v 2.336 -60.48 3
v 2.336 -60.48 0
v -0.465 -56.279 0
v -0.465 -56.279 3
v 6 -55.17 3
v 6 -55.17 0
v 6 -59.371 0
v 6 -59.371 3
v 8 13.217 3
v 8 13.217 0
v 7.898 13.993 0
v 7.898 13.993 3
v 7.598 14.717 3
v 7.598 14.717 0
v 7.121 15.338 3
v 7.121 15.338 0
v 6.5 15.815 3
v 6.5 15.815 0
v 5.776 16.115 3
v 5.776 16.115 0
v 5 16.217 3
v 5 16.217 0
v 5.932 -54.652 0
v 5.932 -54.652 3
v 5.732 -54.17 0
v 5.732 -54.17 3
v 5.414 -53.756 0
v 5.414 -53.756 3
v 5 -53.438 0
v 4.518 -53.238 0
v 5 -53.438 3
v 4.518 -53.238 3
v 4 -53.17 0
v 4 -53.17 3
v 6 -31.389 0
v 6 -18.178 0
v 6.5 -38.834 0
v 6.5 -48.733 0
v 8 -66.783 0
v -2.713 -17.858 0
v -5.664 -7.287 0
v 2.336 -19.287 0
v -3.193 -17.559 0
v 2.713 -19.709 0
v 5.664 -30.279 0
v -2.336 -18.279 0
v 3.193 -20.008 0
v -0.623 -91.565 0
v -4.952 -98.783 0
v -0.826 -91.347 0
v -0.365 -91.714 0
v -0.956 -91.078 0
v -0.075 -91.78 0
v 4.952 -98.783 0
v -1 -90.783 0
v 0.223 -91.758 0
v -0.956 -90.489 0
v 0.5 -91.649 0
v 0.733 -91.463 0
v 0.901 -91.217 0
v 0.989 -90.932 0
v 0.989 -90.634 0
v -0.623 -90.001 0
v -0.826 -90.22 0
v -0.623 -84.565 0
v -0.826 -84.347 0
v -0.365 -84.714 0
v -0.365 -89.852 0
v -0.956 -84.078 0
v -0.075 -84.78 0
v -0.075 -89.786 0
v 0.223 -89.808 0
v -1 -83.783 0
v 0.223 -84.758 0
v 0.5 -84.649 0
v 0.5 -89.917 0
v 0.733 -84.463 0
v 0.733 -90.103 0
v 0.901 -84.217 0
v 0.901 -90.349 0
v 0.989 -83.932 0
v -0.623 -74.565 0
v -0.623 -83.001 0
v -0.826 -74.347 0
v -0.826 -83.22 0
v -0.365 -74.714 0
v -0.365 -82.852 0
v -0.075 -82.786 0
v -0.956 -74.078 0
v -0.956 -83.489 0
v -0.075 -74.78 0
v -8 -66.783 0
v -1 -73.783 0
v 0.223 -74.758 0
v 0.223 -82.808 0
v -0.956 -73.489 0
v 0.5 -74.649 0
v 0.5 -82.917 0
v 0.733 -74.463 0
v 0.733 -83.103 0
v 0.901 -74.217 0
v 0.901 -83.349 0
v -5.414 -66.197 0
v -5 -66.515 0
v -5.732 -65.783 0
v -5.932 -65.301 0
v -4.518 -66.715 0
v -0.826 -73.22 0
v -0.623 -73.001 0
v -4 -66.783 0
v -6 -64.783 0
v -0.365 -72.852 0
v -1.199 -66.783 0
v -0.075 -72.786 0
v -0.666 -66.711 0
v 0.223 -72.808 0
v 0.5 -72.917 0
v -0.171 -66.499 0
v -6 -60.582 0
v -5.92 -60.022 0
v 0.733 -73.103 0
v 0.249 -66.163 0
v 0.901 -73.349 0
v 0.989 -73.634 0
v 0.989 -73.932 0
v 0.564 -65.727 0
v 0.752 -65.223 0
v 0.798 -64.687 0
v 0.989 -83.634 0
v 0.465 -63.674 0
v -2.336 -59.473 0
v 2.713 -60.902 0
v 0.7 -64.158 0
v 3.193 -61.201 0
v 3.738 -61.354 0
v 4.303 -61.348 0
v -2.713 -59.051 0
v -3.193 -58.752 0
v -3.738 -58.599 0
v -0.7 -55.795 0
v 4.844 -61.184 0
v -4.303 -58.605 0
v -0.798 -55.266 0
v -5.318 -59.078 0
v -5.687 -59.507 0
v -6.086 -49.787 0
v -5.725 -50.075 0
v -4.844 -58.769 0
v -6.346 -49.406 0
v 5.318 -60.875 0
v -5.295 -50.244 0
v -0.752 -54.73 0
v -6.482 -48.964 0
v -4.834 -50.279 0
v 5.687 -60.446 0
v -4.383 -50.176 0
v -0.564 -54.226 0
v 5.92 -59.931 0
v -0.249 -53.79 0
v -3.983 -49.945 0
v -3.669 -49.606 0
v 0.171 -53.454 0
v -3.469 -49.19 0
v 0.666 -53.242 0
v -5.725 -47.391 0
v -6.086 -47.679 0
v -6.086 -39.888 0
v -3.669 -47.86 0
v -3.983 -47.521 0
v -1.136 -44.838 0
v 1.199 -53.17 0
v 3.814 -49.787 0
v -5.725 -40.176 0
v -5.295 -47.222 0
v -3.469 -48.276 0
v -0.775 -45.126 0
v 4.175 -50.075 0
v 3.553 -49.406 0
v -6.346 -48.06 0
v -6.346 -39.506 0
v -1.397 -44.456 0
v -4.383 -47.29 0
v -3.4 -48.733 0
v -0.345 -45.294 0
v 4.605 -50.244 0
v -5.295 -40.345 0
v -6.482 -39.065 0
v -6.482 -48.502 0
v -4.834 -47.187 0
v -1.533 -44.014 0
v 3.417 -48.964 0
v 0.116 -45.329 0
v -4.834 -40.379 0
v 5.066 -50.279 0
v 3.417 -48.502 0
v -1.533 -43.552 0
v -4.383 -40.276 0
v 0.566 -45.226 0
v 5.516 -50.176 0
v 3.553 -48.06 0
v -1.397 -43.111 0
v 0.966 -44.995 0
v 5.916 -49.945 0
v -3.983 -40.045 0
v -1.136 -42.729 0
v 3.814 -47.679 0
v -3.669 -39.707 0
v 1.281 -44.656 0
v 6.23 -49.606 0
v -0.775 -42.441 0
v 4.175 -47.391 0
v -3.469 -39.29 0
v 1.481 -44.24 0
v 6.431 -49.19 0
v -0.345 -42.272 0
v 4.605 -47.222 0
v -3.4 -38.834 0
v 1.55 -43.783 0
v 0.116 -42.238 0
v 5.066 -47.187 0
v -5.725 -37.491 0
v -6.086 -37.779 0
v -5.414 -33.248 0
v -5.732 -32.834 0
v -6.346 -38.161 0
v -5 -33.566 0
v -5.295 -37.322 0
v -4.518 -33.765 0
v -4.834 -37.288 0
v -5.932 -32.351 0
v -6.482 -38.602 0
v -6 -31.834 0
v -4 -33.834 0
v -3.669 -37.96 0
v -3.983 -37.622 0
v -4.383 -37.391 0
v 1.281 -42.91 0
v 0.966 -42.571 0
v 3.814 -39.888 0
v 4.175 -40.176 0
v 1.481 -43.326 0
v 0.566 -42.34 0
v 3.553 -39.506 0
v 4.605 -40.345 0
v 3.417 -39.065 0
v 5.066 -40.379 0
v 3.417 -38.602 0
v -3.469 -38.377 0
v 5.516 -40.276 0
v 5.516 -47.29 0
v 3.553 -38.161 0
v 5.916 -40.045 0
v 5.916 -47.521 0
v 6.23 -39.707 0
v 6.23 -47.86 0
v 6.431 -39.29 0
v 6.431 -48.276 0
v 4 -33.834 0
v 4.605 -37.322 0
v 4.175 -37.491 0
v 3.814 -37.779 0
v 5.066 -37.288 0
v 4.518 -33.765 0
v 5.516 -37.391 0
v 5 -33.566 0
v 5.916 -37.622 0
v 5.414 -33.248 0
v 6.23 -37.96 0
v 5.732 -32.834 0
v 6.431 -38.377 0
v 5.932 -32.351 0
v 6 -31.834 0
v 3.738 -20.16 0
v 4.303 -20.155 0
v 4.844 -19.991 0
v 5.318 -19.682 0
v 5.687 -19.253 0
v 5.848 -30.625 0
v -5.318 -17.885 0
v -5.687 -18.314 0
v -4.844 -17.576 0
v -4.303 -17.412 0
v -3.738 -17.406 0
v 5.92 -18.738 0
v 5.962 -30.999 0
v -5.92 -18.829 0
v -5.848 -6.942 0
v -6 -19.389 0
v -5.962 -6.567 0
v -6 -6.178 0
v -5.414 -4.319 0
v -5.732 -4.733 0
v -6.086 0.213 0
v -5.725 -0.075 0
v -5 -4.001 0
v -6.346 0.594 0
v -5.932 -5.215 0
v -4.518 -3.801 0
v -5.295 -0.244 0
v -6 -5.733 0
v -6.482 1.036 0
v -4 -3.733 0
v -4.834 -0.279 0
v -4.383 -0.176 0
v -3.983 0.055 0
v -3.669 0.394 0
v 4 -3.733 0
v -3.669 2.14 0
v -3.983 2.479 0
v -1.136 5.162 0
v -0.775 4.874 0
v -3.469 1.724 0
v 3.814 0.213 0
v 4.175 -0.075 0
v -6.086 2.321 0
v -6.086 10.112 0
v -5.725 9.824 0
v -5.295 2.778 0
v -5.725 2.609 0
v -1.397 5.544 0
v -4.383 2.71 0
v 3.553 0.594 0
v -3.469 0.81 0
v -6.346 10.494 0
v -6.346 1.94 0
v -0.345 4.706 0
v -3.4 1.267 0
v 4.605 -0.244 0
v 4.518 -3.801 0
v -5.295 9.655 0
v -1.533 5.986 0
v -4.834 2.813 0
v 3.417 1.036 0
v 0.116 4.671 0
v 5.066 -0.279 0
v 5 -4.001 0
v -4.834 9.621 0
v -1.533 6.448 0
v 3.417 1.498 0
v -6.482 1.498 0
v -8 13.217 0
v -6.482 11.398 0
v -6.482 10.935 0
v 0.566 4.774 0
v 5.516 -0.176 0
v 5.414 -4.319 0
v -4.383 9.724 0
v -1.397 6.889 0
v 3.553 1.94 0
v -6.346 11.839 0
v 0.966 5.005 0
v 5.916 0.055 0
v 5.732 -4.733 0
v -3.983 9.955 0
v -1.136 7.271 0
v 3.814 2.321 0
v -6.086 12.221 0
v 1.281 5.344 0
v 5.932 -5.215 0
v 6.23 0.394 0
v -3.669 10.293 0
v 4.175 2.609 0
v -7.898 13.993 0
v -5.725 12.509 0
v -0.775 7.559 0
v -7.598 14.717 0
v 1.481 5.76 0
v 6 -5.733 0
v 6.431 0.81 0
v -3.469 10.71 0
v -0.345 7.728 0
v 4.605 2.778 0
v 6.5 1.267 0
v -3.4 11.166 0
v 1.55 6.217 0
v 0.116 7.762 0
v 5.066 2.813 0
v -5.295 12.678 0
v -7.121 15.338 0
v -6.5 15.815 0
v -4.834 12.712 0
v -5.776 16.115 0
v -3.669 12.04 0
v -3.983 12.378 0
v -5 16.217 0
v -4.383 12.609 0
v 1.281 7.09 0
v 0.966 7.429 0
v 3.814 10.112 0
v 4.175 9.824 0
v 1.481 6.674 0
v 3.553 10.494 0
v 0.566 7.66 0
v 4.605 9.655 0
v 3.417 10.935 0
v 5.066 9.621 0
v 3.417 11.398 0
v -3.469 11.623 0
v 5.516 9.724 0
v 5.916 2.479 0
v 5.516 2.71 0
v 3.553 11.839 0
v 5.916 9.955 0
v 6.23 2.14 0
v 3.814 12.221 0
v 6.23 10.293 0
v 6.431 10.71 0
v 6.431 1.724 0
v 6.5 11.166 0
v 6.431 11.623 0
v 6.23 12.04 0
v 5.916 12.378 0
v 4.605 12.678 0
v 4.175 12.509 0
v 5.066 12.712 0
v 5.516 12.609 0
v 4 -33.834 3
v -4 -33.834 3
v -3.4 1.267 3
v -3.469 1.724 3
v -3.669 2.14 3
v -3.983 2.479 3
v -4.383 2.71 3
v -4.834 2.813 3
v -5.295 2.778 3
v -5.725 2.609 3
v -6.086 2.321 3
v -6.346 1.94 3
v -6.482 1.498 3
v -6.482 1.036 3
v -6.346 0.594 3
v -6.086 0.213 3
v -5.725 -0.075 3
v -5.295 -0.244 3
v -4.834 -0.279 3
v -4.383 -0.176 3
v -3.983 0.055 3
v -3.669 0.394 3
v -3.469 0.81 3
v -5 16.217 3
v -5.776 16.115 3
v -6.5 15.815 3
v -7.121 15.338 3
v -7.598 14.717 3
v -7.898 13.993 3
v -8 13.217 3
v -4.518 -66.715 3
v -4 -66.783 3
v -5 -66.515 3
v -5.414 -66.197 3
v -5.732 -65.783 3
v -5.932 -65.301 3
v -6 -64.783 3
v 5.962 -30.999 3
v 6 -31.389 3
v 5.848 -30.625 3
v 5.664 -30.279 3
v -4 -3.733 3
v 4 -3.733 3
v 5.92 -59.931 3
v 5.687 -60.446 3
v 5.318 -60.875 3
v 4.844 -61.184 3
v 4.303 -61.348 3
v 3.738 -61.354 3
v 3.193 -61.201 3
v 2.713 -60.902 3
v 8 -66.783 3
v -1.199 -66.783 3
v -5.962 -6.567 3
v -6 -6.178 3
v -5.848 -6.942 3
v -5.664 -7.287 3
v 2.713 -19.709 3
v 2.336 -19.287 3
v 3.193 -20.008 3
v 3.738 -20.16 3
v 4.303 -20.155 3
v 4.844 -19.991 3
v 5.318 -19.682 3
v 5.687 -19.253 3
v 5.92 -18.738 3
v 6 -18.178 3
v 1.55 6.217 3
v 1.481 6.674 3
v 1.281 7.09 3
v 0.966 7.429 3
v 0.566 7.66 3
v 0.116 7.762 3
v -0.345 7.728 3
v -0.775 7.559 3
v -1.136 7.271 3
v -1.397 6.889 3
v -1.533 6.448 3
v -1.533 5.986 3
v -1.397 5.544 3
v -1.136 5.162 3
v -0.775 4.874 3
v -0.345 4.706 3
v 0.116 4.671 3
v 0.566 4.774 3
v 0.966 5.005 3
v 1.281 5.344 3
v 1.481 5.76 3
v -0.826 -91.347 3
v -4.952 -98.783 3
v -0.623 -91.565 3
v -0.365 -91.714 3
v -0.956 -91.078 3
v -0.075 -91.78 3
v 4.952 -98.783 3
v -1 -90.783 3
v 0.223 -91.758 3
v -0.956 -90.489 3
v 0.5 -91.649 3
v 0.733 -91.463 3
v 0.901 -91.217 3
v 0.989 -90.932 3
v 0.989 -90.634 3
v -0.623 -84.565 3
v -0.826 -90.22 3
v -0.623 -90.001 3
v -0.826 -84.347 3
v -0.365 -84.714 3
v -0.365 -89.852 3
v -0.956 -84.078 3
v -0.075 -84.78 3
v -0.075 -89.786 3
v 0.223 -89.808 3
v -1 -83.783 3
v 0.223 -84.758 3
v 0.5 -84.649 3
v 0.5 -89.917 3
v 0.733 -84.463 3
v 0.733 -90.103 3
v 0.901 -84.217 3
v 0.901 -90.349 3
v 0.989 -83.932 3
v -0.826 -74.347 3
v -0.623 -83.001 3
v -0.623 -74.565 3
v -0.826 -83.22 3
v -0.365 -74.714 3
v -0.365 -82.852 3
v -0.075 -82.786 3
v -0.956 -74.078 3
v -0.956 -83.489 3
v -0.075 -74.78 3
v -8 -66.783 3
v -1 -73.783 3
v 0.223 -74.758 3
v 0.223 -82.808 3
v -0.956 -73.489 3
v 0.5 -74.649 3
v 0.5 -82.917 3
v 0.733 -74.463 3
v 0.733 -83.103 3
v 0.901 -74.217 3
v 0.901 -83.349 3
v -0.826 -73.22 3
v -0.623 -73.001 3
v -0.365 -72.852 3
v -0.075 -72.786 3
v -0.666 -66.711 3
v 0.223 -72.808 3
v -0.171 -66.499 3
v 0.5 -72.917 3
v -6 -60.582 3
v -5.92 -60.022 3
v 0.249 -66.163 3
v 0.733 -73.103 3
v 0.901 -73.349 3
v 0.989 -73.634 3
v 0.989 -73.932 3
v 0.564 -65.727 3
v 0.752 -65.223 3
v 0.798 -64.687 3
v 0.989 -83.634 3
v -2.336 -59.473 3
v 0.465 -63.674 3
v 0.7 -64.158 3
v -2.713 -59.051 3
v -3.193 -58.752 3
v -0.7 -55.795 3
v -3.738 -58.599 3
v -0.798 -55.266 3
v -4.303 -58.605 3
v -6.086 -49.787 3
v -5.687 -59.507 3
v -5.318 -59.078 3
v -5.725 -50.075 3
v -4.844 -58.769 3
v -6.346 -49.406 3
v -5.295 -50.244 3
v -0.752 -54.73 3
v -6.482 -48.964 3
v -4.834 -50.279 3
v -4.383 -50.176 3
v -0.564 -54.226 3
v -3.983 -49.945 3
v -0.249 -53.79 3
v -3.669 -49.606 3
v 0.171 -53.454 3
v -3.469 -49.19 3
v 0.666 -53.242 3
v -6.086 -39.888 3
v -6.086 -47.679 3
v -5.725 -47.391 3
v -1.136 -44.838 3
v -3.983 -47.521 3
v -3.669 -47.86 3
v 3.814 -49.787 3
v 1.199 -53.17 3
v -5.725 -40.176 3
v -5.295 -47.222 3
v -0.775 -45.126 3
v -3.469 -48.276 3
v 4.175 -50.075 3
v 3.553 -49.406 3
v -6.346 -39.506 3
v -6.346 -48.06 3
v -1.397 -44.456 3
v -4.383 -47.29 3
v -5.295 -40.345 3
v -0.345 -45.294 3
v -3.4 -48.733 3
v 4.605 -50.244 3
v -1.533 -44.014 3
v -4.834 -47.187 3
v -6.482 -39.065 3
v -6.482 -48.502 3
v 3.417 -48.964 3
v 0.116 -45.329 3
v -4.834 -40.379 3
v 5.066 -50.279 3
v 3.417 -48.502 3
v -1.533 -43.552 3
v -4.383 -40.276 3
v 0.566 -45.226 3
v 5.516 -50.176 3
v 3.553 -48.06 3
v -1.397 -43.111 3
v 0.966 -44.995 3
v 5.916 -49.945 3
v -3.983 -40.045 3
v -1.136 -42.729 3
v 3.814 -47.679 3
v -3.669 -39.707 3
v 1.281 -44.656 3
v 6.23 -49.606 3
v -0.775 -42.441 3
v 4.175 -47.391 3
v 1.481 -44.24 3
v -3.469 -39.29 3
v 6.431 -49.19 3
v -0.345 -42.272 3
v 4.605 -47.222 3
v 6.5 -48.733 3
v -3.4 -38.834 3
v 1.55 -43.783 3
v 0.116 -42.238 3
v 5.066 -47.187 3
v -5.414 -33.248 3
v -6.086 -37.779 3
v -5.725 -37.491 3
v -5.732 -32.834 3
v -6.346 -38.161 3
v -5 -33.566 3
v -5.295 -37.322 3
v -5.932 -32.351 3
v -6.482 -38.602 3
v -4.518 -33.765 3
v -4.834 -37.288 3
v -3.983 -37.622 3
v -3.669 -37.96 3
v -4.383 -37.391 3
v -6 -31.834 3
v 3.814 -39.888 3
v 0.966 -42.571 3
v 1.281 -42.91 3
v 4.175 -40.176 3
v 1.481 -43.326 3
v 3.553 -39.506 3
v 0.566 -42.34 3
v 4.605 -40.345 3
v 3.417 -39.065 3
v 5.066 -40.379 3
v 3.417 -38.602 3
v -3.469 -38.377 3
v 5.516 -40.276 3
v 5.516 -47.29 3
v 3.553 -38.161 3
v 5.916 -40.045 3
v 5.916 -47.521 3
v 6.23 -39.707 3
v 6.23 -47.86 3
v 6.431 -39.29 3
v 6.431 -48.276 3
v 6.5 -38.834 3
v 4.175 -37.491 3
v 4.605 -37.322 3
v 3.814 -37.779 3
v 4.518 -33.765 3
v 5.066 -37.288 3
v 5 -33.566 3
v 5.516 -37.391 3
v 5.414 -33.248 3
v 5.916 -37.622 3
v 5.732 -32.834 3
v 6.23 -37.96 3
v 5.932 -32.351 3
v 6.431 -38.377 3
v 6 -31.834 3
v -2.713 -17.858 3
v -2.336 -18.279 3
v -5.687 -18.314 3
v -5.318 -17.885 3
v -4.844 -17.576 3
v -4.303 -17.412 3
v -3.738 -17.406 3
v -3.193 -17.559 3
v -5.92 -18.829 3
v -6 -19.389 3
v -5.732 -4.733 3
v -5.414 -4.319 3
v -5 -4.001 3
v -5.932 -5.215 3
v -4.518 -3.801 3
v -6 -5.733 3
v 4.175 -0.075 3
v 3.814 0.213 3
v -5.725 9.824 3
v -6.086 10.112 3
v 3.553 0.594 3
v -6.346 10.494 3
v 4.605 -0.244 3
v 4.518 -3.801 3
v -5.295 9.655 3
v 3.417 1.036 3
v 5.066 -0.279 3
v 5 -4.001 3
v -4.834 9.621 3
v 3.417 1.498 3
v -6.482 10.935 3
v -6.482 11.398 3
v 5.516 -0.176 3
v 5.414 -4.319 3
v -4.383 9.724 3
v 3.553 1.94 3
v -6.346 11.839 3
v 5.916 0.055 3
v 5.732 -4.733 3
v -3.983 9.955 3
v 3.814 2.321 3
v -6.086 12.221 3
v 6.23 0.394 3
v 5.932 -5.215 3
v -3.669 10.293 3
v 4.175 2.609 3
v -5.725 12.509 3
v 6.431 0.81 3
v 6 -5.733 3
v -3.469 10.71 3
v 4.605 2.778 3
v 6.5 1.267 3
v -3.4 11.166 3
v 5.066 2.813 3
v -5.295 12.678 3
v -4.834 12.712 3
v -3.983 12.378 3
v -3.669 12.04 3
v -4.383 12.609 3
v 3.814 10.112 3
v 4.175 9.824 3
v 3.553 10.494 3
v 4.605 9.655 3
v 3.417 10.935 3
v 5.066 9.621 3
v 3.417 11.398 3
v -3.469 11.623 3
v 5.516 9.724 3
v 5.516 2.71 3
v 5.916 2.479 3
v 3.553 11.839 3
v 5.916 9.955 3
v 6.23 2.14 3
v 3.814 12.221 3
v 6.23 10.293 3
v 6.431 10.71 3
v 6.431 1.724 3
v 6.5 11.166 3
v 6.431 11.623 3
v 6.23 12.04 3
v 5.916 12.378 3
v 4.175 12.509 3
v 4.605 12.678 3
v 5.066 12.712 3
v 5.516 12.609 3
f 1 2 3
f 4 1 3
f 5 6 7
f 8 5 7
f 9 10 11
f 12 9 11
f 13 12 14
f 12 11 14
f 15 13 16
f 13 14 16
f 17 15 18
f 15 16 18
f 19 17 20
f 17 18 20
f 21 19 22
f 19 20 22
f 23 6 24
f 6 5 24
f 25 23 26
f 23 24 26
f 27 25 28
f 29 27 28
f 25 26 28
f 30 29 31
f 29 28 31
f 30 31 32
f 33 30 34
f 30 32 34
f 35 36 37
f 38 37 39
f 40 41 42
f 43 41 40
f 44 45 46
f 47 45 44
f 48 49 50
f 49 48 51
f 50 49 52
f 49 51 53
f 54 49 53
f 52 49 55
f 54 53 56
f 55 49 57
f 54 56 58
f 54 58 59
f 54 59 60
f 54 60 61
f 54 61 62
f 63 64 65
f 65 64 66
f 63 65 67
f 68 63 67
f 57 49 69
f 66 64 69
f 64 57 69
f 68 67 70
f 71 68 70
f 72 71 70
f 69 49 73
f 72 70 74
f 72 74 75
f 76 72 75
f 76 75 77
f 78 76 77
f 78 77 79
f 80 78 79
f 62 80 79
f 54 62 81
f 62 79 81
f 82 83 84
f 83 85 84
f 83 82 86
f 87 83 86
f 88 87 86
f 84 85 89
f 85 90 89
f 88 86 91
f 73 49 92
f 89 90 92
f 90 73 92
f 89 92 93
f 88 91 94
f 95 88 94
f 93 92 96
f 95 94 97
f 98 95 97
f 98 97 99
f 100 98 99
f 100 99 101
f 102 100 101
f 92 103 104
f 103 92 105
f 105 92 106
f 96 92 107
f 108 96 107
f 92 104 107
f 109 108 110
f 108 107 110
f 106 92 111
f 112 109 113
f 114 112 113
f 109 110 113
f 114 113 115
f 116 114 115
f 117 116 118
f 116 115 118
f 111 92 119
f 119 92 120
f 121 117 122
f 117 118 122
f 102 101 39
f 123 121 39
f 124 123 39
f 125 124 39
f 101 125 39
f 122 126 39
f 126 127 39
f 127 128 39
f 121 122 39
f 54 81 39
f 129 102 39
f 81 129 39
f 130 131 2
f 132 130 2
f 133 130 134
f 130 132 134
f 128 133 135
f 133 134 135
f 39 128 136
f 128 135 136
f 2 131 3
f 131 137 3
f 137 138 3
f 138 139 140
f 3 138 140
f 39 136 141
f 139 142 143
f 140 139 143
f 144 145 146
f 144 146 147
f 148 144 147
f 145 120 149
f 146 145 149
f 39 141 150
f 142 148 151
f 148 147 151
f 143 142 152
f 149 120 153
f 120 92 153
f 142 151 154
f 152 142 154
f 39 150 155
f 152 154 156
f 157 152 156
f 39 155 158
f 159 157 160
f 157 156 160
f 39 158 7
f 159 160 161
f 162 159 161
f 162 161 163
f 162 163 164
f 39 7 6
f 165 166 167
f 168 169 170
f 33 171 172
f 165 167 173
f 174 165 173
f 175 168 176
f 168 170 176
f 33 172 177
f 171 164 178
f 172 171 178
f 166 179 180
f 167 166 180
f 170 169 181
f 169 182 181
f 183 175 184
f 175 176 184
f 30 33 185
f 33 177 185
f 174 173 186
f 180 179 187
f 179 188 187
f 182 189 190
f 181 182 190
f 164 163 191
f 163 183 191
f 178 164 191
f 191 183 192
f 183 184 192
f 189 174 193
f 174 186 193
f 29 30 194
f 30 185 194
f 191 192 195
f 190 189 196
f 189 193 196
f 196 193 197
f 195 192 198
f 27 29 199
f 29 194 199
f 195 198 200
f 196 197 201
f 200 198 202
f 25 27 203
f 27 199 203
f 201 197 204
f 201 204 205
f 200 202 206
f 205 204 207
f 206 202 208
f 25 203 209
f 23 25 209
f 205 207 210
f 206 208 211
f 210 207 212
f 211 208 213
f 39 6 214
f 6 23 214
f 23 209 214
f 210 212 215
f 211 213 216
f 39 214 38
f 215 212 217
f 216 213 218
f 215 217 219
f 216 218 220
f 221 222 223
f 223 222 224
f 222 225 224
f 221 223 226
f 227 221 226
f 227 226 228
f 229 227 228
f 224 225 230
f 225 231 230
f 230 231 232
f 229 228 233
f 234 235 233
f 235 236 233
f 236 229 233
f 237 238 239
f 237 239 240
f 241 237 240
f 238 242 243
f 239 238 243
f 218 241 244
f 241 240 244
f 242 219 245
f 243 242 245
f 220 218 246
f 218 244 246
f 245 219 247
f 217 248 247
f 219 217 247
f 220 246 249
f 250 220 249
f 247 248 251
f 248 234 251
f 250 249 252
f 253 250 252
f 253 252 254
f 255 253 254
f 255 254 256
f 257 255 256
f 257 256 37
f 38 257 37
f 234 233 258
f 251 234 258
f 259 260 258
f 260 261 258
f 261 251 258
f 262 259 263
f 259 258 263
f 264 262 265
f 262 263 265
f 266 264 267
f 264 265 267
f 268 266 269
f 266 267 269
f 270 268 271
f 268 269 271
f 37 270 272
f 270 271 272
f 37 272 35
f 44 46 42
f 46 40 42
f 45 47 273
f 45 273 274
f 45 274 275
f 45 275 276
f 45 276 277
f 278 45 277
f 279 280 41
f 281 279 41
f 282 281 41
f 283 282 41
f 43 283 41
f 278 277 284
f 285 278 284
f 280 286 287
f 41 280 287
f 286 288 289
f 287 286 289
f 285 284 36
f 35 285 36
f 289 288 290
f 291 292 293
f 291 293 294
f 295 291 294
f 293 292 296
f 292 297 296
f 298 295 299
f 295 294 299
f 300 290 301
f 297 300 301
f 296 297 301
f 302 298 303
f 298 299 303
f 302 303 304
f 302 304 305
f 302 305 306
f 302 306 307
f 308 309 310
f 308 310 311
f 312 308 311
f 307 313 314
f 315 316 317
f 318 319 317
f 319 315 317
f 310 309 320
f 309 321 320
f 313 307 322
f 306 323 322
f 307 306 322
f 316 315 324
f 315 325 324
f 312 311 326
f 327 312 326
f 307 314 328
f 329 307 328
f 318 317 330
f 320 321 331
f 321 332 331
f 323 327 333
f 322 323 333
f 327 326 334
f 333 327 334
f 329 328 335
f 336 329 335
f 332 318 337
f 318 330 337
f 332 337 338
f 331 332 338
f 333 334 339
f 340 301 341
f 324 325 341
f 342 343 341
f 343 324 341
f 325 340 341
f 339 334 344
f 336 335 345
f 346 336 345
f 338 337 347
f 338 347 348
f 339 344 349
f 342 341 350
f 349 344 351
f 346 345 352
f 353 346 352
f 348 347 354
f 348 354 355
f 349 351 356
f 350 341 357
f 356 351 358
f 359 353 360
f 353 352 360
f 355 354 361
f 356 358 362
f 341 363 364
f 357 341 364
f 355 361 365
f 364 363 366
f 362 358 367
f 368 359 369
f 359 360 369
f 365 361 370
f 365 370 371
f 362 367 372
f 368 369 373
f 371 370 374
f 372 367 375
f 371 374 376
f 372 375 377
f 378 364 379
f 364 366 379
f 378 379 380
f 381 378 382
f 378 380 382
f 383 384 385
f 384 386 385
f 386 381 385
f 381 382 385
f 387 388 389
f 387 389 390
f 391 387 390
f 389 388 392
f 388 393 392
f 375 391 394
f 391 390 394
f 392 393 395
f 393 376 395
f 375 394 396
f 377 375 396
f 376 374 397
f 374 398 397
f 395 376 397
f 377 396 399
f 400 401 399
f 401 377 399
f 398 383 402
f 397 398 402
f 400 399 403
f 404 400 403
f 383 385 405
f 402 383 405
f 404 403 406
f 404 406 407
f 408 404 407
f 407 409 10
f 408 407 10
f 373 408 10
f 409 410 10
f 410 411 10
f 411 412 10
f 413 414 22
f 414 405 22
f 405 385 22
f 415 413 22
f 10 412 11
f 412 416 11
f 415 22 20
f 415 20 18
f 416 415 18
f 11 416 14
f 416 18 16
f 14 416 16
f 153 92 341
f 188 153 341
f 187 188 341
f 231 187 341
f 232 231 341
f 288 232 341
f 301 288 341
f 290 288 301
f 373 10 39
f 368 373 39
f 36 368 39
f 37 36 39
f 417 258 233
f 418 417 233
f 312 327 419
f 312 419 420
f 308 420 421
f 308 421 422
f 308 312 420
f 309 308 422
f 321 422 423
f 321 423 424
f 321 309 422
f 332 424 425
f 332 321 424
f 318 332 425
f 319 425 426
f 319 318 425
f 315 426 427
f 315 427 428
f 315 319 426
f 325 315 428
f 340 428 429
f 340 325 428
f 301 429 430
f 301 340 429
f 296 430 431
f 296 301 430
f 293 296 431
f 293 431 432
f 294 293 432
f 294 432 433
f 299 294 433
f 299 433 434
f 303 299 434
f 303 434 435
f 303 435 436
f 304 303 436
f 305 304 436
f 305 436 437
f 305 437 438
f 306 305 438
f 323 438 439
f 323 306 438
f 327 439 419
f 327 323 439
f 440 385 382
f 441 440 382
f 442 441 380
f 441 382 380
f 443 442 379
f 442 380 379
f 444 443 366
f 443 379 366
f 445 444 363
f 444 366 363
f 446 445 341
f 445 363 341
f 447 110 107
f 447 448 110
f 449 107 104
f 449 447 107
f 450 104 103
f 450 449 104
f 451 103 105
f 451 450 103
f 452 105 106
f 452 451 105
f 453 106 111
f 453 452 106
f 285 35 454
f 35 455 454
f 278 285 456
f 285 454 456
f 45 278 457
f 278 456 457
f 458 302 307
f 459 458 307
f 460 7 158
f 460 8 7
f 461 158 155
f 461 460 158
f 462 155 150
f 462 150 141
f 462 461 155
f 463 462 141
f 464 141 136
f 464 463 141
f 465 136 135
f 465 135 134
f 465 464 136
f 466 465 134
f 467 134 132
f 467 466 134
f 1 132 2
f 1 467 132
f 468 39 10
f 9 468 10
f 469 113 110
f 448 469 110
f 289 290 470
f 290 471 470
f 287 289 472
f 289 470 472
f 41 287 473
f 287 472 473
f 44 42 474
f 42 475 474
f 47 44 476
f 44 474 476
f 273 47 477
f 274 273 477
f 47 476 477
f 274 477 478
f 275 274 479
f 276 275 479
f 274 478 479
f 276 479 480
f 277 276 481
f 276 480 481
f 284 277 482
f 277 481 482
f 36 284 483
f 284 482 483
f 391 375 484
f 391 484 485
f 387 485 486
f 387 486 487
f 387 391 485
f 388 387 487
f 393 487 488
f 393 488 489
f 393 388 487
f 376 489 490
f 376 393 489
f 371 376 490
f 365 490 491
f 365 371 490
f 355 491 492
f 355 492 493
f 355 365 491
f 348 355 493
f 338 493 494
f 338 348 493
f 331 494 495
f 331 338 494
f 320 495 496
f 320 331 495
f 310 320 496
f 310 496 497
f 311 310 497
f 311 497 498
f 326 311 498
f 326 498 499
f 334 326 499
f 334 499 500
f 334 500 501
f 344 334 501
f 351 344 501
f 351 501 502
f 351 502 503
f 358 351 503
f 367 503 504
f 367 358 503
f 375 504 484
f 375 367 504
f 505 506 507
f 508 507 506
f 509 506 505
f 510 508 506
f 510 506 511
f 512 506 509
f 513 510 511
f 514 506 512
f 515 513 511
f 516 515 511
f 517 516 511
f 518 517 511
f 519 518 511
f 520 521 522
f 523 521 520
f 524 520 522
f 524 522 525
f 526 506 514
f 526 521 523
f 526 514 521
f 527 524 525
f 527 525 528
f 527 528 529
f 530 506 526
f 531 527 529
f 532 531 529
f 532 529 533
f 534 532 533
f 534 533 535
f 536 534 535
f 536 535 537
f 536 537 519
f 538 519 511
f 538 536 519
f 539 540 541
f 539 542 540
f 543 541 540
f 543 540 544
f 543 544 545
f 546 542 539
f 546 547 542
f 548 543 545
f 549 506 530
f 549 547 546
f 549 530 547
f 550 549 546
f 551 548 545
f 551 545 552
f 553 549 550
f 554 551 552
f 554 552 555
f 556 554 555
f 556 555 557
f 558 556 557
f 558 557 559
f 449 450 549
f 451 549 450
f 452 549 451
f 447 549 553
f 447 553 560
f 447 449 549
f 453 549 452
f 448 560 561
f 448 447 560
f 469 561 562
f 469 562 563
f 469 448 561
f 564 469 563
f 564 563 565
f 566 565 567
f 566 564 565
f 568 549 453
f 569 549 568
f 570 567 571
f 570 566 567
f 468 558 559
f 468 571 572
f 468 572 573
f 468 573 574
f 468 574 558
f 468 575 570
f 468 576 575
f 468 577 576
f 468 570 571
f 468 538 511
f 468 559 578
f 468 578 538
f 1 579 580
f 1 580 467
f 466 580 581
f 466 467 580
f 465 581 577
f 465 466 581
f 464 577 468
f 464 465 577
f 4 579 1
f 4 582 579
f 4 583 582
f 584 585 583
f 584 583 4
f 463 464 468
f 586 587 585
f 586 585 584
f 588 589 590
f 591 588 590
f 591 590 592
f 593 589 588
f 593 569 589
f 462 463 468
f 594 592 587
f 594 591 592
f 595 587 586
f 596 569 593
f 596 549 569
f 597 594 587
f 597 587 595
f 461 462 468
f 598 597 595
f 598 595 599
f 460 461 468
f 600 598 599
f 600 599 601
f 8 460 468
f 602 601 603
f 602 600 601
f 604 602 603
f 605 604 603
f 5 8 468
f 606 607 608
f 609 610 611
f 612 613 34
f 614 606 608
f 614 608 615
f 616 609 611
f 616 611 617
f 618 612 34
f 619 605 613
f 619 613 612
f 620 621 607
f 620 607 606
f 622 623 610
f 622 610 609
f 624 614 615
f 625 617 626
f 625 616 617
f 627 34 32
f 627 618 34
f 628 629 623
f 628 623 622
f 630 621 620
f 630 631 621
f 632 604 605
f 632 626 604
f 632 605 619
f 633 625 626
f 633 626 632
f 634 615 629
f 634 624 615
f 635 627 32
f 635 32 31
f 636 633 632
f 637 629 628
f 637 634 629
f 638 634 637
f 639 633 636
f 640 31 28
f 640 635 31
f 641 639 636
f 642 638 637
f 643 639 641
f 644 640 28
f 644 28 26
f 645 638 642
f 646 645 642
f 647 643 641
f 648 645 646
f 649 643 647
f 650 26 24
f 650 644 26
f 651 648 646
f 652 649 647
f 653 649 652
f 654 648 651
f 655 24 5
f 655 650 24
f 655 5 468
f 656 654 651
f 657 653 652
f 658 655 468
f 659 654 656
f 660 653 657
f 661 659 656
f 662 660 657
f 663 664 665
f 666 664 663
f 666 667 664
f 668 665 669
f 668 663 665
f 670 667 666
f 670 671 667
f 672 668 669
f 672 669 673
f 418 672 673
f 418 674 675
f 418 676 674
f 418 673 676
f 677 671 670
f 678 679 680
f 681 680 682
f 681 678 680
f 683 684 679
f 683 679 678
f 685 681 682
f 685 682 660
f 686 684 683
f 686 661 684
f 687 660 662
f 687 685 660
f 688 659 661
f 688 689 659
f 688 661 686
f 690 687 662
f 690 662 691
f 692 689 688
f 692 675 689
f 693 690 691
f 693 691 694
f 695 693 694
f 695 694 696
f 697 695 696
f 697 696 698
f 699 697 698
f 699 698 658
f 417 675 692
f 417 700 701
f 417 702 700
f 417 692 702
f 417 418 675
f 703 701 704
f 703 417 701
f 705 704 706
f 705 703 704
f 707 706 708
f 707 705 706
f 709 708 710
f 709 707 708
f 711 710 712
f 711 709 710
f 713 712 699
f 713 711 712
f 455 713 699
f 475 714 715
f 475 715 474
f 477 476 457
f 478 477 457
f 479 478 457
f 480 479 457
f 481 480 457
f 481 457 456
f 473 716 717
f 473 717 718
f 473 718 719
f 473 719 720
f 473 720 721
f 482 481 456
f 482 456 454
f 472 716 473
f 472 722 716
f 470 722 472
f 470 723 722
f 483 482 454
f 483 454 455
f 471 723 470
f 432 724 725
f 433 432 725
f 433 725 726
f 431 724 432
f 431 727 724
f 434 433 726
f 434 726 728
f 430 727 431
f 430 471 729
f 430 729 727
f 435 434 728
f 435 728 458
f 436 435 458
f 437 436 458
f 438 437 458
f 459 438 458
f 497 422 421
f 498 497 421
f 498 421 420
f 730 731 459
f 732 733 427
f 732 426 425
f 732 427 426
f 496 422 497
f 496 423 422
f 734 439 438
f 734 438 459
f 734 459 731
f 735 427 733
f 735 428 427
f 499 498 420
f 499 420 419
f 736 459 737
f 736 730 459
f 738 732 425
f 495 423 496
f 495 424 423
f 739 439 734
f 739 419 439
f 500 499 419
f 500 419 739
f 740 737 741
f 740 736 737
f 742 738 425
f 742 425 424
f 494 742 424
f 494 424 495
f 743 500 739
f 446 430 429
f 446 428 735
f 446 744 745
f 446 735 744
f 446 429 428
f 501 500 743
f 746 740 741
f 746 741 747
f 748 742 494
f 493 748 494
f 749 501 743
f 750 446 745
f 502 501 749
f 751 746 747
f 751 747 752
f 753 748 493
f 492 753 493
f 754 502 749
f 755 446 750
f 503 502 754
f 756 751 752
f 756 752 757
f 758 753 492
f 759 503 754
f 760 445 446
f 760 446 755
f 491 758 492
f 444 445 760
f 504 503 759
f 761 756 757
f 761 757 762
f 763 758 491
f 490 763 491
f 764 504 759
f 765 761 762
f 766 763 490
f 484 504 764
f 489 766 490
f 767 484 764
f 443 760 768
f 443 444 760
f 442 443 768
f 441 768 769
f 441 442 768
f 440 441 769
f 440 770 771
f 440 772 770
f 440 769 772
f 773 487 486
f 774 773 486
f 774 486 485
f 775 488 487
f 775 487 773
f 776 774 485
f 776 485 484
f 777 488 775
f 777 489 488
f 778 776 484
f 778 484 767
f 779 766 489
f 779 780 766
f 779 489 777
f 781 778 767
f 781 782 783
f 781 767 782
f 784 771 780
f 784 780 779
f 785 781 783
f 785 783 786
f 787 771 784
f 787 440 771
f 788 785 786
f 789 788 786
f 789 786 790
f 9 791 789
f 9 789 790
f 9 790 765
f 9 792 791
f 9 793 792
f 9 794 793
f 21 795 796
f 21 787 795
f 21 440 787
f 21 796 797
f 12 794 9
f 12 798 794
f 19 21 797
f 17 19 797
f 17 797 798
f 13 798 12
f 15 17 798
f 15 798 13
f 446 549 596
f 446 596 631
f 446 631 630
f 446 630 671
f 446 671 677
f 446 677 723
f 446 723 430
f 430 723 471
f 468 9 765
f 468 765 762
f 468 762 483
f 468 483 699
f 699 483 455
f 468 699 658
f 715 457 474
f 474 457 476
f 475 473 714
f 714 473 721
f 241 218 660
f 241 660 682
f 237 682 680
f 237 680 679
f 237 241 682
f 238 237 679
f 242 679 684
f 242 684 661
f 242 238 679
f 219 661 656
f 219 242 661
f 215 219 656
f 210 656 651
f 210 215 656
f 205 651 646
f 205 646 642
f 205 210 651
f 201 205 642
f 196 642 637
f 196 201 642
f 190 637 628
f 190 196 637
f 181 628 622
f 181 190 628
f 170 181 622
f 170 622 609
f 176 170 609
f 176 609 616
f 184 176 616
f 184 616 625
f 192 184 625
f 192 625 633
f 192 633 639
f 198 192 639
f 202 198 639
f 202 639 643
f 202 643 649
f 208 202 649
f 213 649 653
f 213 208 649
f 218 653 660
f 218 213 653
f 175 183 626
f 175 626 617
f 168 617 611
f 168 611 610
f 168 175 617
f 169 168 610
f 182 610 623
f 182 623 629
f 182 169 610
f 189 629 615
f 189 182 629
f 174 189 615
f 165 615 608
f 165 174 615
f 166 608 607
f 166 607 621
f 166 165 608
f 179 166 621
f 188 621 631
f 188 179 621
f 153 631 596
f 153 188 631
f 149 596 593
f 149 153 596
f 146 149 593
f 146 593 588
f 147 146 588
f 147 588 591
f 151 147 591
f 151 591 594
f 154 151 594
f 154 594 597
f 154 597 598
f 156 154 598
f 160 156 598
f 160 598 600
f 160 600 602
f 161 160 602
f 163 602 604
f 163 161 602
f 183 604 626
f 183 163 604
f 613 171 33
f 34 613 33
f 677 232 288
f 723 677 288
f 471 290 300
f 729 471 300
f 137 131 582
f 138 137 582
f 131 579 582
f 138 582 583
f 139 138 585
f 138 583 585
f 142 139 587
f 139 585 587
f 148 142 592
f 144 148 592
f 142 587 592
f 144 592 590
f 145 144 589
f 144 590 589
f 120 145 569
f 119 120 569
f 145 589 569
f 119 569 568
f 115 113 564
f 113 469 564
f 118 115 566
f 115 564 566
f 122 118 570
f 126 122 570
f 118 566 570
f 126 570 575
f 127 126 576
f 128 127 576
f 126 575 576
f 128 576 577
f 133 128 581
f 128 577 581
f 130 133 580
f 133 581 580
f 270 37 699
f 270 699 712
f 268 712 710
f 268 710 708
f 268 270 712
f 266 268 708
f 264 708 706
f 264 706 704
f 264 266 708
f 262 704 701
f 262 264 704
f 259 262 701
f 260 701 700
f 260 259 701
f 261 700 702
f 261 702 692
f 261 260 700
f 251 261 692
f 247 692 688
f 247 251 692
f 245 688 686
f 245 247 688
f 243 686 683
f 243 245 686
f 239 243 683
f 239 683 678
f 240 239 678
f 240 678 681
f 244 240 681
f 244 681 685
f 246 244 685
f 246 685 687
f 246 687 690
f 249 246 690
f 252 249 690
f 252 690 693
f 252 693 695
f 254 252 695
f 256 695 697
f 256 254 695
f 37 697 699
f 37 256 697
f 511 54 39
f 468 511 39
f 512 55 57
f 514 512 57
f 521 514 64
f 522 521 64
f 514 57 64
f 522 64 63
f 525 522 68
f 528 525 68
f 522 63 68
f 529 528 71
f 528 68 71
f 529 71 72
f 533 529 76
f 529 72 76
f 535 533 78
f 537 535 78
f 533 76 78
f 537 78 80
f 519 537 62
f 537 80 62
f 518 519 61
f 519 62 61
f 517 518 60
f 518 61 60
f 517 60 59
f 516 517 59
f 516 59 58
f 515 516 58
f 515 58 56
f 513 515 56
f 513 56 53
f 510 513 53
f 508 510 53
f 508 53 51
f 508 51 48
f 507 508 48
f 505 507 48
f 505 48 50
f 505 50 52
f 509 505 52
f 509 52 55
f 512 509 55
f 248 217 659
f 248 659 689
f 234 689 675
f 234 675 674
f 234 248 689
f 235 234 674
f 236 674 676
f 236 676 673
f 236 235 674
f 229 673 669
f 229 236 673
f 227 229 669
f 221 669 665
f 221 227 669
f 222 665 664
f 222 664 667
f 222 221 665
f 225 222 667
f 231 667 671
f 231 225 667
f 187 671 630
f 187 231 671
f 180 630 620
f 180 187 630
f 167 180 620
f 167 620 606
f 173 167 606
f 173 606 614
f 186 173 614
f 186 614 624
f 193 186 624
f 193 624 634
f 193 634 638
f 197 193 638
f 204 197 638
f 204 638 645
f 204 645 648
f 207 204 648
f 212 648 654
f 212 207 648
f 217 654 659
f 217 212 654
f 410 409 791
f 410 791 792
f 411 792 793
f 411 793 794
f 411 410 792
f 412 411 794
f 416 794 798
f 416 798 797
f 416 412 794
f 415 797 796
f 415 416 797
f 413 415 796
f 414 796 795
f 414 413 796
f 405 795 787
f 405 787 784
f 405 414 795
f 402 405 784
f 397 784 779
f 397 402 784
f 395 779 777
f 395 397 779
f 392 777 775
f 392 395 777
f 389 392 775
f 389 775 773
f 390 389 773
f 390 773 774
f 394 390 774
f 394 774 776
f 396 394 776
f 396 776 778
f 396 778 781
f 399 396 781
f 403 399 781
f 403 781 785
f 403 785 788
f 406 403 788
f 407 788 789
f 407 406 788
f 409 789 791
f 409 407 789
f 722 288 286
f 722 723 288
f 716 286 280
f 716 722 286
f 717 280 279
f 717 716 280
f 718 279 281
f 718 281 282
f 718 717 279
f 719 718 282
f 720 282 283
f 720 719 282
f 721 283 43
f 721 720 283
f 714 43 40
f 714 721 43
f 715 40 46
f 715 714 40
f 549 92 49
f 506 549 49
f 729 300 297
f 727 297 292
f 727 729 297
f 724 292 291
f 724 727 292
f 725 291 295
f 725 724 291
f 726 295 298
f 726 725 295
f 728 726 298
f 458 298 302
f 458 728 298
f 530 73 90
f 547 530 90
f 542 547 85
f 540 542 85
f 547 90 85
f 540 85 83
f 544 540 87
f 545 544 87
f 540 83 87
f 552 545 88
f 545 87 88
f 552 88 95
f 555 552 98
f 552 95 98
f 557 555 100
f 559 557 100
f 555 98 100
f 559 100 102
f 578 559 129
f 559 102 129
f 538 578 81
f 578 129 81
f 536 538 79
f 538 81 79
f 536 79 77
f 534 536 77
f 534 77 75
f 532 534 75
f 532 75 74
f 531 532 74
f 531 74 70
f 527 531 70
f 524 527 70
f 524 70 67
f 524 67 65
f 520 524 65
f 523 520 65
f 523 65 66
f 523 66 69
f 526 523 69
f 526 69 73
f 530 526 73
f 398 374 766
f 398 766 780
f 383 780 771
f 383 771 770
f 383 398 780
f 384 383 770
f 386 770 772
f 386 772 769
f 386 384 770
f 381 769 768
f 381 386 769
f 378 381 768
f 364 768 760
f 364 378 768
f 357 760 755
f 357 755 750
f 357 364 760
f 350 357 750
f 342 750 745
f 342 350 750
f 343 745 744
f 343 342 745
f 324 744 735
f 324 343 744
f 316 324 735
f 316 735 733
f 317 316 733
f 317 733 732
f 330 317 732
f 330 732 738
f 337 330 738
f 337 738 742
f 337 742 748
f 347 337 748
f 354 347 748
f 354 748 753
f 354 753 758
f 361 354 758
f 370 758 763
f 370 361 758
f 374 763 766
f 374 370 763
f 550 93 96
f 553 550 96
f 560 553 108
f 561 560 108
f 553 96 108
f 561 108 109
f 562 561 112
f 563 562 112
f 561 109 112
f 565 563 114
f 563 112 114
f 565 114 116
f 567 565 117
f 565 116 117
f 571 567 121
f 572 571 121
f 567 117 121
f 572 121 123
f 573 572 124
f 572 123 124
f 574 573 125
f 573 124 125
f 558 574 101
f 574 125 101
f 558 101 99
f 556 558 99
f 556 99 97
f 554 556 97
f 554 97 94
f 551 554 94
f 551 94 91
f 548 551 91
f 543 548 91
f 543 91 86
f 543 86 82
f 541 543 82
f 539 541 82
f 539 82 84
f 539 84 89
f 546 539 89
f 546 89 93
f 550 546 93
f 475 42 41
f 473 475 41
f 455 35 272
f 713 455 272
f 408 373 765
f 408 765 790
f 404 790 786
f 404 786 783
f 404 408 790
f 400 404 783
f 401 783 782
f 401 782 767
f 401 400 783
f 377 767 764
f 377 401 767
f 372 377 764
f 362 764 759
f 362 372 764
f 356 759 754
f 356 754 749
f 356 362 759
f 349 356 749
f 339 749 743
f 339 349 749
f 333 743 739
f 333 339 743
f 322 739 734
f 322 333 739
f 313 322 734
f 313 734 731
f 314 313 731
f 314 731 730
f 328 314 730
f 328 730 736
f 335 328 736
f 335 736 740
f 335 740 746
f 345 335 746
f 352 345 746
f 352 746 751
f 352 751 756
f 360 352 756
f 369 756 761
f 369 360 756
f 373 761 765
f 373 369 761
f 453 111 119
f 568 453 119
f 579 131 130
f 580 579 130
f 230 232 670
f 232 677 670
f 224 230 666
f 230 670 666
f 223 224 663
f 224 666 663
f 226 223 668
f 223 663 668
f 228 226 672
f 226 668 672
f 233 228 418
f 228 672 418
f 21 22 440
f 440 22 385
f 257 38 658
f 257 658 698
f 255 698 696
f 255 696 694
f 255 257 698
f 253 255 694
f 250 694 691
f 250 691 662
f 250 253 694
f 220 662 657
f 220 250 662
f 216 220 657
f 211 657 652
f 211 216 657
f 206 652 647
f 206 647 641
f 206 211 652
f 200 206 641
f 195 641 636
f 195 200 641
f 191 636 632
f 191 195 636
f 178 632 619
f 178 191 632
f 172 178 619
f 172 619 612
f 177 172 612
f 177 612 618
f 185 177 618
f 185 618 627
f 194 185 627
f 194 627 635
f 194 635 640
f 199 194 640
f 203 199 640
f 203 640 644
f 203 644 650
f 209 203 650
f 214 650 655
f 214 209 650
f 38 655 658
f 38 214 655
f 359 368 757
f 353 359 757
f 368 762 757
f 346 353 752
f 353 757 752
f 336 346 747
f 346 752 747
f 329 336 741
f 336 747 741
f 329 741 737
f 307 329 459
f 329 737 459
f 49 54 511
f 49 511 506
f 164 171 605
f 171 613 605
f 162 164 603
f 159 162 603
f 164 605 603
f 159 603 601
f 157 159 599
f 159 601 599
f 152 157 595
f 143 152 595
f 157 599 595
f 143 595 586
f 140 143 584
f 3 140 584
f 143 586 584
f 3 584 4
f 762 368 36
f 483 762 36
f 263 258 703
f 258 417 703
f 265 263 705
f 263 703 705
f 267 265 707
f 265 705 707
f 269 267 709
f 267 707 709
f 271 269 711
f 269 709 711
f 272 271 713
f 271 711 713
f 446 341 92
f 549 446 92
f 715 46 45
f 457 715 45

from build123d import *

# Parameters (mm, degrees)
SKETCH_1_R          = 1.55
EXTRUDE_1_DEPTH     = 3
SKETCH_2_W          = 30.67898901
SKETCH_2_H          = 20.291672983
CUT_EXTRUDE_1_DEPTH = 10
SKETCH_3_R          = 1
CUT_EXTRUDE_2_DEPTH = 20
CUT_EXTRUDE_3_DEPTH = 100.15206986
FILLET_1_R          = 2


with BuildPart() as part:
    # 草图1 → 凸台-拉伸1 (new body)
    with BuildSketch(Plane.XY):
        with BuildLine():
            Line((5, 16.216737463), (-5, 16.216737463))
            ThreePointArc((-5, 16.216737463), (-7.121320344, 15.338057806), (-8, 13.216737463))
            Line((-8, 13.216737463), (-8, -66.783262537))
            Line((-8, -66.783262537), (-4, -108.783262537))
            Line((-4, -108.783262537), (4, -108.783262537))
            Line((4, -108.783262537), (8, -66.783262537))
            Line((8, -66.783262537), (8, 13.216737463))
            ThreePointArc((8, 13.216737463), (7.121320344, 15.338057806), (5, 16.216737463))
        make_face()
        with Locations((-4.949747468, 11.166484931)):
            Circle(SKETCH_1_R, mode=Mode.SUBTRACT)
        with Locations((4.949747468, 11.166484931)):
            Circle(SKETCH_1_R, mode=Mode.SUBTRACT)
        with Locations((4.949747468, 1.266989995)):
            Circle(SKETCH_1_R, mode=Mode.SUBTRACT)
        with Locations((-4.949747468, 1.266989995)):
            Circle(SKETCH_1_R, mode=Mode.SUBTRACT)
        with Locations((0, -43.783262537)):
            Circle(SKETCH_1_R, mode=Mode.SUBTRACT)
        with Locations((4.949747468, -38.833515069)):
            Circle(SKETCH_1_R, mode=Mode.SUBTRACT)
        with Locations((-4.949747468, -38.833515069)):
            Circle(SKETCH_1_R, mode=Mode.SUBTRACT)
        with Locations((4.949747468, -48.733010005)):
            Circle(SKETCH_1_R, mode=Mode.SUBTRACT)
        with Locations((-4.949747468, -48.733010005)):
            Circle(SKETCH_1_R, mode=Mode.SUBTRACT)
        with Locations((0, 6.216737463)):
            Circle(SKETCH_1_R, mode=Mode.SUBTRACT)
    extrude(amount=EXTRUDE_1_DEPTH)

    # 草图2 → 切除-拉伸1 (cut)
    with BuildSketch(Plane(origin=(0, 0, 0), x_dir=(-1, 0, 0), z_dir=(0, 0, -1))):
        with Locations((1.230440634, -108.929099029)):
            Rectangle(SKETCH_2_W, SKETCH_2_H)
    extrude(amount=-CUT_EXTRUDE_1_DEPTH, mode=Mode.SUBTRACT)

    # 草图3 → 切除-拉伸2 (cut)
    with BuildSketch(Plane(origin=(0, 0, 0), x_dir=(-1, 0, 0), z_dir=(0, 0, -1))):
        with Locations((0, -83.783262537)):
            Circle(SKETCH_3_R)
        with Locations((0, -90.783262537)):
            Circle(SKETCH_3_R)
        with Locations((0, -73.783262537)):
            Circle(SKETCH_3_R)
    extrude(amount=-CUT_EXTRUDE_2_DEPTH, mode=Mode.SUBTRACT)

    # 草图4 → 切除-拉伸3 (cut, through all)
    with BuildSketch(Plane(origin=(0, 0, 0), x_dir=(-1, 0, 0), z_dir=(0, 0, -1))):
        Polygon((6, -12.783262537), (-6, -30.783262537), (-6, -33.833515069), (6, -33.833515069), align=None)
        Polygon((6, -3.733010005), (-6, -3.733010005), (-6, -24.783262537), (6, -6.783262537), align=None)
        Polygon((6, -66.783262537), (6, -53.976503319), (-2.537839478, -66.783262537), align=None)
        Polygon((-6, -65.976503319), (2.537839478, -53.169744102), (-6, -53.169744102), align=None)
    extrude(amount=-CUT_EXTRUDE_3_DEPTH, mode=Mode.SUBTRACT)

    # 圆角1
    fillet_1_edges = [part.edges().sort_by_distance(p)[0] for p in [
        (6, -30.783262537, 1.5),
        (-6, -12.783262537, 1.5),
        (-6, -33.833515069, 1.5),
        (6, -33.833515069, 1.5),
        (-2.537839478, -53.169744102, 1.5),
        (6, -65.976503319, 1.5),
        (6, -53.169744102, 1.5),
        (-6, -53.976503319, 1.5),
        (-6, -66.783262537, 1.5),
        (2.537839478, -66.783262537, 1.5),
        (6, -24.783262537, 1.5),
        (6, -3.733010005, 1.5),
        (-6, -3.733010005, 1.5),
        (-6, -6.783262537, 1.5),
    ]]
    fillet(fillet_1_edges, radius=FILLET_1_R)


solid = part.part
